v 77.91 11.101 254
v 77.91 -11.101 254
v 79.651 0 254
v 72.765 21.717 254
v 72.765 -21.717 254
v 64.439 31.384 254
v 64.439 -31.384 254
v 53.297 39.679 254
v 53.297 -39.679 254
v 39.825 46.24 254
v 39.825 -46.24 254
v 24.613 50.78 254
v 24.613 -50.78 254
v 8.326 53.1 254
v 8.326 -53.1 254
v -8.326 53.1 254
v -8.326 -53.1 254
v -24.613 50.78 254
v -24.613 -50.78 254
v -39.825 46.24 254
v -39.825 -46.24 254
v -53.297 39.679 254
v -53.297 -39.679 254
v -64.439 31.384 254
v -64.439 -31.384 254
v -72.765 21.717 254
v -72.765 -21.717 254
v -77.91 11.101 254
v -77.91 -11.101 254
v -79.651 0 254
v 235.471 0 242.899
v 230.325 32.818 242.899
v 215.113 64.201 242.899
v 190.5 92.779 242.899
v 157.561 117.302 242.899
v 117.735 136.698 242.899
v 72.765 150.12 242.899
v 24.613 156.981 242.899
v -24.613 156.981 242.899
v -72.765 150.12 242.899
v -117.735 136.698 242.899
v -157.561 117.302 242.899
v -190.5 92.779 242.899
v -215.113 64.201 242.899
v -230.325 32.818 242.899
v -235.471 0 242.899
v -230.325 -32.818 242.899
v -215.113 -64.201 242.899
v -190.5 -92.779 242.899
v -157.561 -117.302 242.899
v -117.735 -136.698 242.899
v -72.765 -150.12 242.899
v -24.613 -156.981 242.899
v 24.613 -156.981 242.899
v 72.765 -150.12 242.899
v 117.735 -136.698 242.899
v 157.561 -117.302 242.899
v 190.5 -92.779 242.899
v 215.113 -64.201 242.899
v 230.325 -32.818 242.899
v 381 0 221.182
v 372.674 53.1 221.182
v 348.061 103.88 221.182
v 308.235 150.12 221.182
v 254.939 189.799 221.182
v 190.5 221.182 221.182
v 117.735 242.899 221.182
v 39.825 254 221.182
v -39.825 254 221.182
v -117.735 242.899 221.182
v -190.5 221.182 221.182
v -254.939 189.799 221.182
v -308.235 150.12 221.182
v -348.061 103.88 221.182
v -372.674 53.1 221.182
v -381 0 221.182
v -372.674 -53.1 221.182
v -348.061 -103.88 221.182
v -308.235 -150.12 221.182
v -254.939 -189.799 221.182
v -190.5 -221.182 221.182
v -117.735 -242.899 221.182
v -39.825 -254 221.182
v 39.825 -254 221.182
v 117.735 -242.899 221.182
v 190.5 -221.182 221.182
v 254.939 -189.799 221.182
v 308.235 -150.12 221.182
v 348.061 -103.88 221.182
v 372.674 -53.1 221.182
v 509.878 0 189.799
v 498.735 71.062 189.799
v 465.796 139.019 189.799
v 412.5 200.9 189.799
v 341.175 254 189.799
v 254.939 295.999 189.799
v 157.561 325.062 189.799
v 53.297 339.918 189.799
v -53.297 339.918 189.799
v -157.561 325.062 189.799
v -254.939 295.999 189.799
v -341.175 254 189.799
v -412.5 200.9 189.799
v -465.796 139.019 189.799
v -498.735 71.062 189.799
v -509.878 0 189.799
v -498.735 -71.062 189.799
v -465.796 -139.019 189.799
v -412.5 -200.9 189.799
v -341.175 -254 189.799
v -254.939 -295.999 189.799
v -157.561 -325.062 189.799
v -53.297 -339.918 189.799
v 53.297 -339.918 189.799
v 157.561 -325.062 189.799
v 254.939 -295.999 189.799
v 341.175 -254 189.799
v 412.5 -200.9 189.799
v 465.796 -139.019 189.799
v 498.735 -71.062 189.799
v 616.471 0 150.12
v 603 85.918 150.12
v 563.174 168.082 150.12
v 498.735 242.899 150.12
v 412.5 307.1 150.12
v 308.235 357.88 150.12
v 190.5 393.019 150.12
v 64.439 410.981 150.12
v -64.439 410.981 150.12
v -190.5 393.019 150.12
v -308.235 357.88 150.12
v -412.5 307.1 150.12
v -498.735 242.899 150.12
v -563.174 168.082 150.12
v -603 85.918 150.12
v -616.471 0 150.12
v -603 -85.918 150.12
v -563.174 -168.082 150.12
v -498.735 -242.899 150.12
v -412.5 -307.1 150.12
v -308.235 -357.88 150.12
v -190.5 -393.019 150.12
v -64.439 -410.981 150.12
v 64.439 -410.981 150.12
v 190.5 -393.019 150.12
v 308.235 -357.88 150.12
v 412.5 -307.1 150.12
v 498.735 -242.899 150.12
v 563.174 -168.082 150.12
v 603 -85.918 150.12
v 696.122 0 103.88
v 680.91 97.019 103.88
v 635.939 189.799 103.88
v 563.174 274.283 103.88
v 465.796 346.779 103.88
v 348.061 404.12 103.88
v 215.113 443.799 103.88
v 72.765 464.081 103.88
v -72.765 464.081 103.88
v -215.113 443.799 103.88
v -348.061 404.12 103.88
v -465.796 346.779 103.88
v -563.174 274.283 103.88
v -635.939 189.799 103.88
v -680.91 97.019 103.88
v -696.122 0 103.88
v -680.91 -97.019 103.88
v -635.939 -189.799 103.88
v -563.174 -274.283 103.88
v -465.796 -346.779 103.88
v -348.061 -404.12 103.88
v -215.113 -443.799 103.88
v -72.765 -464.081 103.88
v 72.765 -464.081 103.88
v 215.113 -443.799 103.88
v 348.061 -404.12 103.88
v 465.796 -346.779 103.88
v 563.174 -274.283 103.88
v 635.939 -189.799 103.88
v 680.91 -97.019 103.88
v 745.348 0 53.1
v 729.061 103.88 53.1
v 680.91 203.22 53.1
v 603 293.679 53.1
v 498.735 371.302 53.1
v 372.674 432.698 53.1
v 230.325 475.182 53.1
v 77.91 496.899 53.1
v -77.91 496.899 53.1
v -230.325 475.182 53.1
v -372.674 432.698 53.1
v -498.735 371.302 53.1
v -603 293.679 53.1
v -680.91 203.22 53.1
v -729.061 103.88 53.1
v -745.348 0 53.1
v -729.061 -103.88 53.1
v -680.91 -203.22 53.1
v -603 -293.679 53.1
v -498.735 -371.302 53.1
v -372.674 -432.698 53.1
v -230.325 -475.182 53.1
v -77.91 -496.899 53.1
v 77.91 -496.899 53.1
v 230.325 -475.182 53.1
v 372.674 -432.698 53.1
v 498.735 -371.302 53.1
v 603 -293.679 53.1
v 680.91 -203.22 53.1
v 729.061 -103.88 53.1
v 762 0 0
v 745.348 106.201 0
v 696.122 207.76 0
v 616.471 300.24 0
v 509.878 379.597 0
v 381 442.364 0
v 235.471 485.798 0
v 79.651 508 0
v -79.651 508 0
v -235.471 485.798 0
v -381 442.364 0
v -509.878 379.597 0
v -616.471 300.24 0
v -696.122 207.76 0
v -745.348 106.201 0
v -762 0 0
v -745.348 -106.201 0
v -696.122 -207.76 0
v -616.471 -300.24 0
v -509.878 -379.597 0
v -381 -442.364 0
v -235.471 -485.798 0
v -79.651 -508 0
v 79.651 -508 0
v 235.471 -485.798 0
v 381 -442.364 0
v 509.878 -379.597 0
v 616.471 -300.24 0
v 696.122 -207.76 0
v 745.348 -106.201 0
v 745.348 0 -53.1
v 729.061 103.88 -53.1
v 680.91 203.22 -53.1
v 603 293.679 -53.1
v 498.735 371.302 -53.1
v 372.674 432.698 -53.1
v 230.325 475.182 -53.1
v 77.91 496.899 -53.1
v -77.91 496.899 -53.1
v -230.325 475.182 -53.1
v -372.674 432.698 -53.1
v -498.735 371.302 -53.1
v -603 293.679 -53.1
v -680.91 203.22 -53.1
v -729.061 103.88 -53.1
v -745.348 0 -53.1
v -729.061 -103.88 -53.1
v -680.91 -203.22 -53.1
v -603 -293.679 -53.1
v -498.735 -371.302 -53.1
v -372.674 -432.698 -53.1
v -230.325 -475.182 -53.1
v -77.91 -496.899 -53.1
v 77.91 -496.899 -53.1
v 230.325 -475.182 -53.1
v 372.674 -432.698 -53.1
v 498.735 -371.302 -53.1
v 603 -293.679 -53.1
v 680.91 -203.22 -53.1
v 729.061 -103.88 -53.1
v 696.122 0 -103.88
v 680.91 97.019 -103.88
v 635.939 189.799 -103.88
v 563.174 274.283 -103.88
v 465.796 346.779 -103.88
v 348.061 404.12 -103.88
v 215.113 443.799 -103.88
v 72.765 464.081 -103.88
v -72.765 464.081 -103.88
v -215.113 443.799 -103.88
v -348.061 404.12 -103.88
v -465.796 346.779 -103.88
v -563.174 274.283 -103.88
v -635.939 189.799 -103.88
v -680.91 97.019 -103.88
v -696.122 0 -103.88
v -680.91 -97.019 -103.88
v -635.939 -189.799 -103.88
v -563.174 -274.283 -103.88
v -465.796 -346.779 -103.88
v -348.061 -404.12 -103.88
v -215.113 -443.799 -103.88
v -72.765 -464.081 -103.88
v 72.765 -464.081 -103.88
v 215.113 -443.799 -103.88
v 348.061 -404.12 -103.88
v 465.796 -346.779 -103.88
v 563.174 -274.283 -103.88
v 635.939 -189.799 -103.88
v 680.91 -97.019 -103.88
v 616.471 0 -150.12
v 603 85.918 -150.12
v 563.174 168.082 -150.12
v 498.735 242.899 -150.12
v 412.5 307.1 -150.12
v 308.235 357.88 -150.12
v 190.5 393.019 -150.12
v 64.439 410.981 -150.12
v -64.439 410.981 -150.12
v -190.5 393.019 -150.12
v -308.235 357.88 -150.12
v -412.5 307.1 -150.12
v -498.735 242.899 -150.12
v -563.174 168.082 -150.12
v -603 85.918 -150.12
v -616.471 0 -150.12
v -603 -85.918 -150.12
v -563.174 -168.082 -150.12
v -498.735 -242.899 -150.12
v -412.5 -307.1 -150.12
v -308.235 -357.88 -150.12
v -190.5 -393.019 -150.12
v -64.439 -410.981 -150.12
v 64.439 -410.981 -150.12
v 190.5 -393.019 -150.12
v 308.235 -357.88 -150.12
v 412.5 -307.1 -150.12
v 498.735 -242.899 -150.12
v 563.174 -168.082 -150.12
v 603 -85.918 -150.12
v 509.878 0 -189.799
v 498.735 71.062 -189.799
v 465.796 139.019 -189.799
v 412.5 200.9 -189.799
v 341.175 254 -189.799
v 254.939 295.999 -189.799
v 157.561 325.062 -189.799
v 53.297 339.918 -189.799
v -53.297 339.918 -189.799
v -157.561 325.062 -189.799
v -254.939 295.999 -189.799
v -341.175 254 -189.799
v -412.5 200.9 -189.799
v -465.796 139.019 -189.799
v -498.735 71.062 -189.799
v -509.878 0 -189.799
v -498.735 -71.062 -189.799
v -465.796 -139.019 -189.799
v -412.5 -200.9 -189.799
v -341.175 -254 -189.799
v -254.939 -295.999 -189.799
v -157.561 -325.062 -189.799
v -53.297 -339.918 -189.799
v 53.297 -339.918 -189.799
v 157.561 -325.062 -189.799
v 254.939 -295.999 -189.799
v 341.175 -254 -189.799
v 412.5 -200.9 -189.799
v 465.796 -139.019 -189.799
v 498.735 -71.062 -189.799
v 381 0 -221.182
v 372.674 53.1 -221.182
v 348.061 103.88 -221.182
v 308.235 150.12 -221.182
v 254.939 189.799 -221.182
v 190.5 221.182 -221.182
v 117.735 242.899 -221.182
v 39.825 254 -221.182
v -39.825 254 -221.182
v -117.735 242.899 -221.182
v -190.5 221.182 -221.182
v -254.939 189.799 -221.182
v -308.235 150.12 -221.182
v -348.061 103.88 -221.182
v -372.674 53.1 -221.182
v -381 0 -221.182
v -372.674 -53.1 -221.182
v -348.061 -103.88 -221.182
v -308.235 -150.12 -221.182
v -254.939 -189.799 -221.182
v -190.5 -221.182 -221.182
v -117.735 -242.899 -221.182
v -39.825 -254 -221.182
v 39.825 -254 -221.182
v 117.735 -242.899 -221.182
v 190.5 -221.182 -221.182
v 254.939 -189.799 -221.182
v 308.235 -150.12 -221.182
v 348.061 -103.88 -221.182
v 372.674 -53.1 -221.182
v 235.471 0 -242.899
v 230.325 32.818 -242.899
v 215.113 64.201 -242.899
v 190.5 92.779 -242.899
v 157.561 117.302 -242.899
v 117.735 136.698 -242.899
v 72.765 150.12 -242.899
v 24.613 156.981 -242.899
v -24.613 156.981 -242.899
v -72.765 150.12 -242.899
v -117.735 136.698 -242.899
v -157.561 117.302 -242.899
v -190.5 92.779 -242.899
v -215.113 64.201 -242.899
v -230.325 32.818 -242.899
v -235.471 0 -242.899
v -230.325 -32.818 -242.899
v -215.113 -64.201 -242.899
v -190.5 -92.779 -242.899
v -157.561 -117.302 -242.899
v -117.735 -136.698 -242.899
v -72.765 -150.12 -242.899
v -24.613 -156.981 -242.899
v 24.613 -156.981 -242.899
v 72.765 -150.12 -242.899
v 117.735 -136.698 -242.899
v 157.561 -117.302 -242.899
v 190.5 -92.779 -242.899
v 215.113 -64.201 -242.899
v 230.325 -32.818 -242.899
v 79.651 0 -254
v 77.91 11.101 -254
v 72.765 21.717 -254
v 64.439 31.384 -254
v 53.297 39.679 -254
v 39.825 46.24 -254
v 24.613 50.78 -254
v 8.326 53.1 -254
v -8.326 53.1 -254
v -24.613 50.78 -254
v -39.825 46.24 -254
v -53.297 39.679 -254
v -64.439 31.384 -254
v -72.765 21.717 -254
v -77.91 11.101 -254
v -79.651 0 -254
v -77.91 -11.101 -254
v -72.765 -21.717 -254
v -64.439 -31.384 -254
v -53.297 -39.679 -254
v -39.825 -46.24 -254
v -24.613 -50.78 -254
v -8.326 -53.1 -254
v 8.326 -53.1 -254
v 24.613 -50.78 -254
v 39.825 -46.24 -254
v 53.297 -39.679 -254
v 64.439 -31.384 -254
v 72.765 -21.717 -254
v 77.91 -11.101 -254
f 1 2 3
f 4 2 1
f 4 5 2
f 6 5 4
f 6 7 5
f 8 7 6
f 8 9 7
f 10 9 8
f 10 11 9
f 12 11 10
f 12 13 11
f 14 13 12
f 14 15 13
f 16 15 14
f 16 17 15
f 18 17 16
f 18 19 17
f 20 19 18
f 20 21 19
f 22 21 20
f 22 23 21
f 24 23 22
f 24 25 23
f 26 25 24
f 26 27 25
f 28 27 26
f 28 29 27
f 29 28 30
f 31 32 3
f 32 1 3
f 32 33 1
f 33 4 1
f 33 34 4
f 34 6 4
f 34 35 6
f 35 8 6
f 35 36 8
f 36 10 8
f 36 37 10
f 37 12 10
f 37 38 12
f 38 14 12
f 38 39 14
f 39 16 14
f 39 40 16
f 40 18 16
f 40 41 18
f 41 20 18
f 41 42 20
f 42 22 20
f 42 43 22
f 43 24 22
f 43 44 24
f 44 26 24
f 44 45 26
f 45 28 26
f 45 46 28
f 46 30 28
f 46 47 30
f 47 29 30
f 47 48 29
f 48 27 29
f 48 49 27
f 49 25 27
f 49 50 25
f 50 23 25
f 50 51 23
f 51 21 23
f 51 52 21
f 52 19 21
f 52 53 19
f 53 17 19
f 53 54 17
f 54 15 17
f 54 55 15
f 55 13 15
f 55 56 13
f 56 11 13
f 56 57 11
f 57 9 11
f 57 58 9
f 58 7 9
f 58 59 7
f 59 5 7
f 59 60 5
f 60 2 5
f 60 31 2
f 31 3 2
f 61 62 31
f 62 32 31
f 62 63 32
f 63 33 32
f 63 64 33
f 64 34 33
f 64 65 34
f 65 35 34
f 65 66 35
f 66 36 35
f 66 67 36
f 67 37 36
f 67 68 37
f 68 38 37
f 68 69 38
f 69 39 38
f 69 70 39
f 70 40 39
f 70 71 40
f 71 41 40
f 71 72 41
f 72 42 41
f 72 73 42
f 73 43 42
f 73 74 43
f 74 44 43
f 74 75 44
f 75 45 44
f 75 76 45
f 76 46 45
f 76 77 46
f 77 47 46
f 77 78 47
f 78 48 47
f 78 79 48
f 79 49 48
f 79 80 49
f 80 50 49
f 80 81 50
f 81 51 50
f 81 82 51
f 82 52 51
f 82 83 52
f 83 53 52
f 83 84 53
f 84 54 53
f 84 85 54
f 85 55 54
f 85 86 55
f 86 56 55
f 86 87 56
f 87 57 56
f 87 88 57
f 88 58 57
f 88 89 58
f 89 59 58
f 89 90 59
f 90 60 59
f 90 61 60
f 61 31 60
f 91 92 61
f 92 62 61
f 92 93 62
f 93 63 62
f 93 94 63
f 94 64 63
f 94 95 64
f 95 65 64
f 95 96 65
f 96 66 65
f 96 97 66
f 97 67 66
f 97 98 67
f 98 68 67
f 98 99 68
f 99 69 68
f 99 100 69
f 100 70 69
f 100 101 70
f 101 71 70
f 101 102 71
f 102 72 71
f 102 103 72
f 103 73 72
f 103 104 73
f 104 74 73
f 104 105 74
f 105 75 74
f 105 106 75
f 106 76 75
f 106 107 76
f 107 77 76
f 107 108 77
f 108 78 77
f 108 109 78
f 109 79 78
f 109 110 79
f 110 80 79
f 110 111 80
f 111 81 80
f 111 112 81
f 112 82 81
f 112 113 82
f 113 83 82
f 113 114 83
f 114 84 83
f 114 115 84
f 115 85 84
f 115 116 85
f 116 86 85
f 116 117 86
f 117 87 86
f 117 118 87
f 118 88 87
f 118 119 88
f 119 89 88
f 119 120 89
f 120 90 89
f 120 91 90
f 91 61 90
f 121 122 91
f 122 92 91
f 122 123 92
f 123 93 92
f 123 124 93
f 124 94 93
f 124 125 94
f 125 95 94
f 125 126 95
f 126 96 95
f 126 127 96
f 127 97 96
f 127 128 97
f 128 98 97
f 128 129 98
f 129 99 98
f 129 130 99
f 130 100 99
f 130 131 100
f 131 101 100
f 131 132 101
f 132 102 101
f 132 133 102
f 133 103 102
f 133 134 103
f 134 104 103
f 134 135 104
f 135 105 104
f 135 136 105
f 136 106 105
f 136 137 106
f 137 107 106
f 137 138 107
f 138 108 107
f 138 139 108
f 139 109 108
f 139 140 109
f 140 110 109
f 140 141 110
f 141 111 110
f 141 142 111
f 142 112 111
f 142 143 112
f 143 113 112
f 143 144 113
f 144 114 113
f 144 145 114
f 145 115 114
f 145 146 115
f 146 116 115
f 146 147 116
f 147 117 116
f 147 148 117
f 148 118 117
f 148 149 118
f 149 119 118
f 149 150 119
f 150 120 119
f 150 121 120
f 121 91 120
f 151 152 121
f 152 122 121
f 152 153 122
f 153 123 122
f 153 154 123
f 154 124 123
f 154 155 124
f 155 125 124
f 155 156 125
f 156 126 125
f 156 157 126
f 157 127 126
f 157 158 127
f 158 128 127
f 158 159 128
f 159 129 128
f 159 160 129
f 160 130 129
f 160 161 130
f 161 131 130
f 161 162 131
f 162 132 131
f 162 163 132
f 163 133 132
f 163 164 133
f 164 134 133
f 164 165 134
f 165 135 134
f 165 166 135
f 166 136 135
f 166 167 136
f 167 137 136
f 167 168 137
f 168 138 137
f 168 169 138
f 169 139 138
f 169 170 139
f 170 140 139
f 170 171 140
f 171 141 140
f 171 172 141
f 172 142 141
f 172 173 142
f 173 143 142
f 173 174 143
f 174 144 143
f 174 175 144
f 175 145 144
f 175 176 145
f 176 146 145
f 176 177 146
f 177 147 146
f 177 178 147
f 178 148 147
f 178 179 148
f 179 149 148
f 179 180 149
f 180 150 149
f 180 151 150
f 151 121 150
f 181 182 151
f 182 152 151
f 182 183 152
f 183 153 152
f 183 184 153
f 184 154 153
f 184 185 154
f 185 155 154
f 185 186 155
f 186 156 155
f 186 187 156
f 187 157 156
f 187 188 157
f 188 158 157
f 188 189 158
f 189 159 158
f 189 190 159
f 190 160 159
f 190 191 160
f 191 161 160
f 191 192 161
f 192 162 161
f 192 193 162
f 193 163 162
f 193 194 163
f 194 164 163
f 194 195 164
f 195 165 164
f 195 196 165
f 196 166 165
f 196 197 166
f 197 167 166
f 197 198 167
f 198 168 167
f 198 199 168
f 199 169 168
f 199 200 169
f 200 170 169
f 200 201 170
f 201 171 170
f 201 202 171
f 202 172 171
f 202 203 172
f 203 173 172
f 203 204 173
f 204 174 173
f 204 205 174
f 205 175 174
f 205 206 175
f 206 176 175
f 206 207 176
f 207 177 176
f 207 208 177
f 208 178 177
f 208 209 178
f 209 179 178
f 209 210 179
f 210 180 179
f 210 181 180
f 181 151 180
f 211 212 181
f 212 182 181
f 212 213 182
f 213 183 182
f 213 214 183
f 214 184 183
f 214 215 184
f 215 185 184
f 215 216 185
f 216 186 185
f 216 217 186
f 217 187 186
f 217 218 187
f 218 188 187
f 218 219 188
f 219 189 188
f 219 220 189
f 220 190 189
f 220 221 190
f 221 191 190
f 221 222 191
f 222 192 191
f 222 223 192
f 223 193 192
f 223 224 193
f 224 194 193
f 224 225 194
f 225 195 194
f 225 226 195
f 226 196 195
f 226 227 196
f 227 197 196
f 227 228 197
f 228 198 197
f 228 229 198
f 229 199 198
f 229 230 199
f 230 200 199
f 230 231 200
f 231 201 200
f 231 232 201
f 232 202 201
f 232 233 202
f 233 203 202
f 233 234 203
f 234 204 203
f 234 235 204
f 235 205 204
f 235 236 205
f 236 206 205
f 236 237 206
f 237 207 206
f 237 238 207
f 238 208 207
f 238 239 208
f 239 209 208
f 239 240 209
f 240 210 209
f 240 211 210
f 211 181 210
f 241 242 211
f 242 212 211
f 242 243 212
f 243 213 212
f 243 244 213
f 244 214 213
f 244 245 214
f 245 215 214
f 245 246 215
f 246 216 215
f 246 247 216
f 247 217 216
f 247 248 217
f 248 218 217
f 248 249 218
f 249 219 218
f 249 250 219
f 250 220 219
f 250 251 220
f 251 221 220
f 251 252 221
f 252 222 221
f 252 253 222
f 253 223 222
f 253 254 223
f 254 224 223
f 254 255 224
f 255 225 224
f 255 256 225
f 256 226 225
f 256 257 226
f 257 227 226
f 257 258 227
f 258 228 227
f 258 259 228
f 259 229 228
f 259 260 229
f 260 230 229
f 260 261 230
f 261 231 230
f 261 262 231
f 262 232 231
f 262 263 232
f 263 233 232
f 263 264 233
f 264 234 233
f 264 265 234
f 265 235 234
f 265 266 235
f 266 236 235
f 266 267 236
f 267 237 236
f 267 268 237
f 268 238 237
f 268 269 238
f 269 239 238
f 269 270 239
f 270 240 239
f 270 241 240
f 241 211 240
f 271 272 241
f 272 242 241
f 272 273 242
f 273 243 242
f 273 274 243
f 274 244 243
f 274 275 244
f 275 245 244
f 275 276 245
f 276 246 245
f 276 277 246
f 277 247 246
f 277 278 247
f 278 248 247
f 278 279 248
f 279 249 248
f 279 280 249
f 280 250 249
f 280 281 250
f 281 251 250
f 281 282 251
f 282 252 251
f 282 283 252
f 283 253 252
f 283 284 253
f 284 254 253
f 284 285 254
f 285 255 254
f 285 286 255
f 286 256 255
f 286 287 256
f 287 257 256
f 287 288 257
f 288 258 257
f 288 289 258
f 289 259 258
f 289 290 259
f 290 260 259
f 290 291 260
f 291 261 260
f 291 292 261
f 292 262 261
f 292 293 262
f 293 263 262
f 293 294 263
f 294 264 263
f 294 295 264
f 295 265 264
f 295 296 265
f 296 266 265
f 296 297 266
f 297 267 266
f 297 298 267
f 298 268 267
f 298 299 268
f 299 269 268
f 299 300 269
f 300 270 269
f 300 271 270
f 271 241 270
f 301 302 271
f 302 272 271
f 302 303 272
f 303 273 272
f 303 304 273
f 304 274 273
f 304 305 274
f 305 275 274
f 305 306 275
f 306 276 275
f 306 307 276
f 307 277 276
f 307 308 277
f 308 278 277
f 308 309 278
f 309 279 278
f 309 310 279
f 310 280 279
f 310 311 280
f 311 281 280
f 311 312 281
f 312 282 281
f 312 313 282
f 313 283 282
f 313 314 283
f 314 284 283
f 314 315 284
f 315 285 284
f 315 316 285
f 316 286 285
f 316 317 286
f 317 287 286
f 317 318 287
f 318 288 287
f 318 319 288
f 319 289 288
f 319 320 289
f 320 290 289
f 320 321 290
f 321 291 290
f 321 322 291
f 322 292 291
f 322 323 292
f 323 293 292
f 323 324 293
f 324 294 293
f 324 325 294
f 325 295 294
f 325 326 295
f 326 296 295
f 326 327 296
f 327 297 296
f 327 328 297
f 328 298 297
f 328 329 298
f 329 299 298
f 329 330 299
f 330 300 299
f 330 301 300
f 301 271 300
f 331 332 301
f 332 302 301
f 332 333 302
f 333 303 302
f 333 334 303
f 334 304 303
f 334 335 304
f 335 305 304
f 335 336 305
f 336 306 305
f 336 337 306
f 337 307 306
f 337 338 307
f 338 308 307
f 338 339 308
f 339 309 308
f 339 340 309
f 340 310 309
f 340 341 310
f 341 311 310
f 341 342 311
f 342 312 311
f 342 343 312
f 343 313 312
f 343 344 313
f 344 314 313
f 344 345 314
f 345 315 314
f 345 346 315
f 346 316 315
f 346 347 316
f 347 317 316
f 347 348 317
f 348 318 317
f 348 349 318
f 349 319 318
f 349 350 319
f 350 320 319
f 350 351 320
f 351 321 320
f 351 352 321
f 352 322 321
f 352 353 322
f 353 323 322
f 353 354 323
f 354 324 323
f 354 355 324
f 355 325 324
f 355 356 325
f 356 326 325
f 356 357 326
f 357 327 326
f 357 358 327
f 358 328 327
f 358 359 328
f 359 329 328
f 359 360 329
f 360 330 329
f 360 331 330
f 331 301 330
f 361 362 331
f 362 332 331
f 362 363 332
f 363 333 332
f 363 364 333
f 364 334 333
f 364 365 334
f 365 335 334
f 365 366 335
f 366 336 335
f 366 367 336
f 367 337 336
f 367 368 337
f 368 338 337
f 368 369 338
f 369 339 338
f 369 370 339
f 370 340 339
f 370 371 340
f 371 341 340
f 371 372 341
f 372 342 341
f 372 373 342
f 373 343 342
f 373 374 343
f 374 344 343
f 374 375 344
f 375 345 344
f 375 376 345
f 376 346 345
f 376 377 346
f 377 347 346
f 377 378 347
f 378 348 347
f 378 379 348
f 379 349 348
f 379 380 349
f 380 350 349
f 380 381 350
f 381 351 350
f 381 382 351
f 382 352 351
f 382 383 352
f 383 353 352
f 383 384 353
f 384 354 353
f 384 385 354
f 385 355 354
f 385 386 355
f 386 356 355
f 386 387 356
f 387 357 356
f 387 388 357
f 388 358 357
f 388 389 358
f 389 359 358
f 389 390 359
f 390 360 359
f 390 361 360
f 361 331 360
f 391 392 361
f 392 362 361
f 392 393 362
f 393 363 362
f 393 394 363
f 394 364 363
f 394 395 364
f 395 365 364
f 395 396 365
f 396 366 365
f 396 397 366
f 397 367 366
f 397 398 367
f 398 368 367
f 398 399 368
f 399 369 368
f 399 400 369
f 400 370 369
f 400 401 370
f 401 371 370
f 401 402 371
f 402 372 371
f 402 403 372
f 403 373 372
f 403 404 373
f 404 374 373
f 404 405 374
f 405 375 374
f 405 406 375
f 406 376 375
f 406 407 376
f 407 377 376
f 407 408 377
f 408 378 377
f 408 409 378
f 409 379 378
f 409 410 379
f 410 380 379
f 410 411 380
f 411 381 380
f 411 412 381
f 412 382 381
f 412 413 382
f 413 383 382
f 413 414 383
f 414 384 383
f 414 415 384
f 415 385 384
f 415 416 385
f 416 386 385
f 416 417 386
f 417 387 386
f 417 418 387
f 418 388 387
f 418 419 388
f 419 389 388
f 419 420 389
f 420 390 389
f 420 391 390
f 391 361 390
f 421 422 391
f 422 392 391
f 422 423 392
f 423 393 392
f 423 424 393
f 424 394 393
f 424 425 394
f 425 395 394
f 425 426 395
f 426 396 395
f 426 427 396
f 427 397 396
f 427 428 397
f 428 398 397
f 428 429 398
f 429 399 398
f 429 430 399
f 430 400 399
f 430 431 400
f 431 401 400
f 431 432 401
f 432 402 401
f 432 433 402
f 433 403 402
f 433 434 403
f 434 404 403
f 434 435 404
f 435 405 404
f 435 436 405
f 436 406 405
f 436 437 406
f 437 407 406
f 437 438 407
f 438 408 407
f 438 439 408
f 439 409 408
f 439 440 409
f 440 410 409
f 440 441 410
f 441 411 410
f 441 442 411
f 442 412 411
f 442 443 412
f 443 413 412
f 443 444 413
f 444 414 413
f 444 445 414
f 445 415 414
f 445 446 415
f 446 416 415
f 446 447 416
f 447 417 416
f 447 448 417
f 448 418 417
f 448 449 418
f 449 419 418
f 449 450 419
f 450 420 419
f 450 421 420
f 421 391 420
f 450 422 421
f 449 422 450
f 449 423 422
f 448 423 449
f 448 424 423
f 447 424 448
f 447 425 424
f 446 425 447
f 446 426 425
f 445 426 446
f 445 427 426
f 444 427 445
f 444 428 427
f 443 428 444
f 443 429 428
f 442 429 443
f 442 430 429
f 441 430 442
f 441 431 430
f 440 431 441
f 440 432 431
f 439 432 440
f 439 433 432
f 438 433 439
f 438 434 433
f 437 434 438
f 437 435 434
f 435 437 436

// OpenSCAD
// Unit of length: Unit.MM
resize(newsize = [1524.0, 1016.0, 508.0], auto = [false, false, false])
{
   sphere(d = 1524.0, $fa = 12.0, $fs = 2.0, $fn = 0);
}
